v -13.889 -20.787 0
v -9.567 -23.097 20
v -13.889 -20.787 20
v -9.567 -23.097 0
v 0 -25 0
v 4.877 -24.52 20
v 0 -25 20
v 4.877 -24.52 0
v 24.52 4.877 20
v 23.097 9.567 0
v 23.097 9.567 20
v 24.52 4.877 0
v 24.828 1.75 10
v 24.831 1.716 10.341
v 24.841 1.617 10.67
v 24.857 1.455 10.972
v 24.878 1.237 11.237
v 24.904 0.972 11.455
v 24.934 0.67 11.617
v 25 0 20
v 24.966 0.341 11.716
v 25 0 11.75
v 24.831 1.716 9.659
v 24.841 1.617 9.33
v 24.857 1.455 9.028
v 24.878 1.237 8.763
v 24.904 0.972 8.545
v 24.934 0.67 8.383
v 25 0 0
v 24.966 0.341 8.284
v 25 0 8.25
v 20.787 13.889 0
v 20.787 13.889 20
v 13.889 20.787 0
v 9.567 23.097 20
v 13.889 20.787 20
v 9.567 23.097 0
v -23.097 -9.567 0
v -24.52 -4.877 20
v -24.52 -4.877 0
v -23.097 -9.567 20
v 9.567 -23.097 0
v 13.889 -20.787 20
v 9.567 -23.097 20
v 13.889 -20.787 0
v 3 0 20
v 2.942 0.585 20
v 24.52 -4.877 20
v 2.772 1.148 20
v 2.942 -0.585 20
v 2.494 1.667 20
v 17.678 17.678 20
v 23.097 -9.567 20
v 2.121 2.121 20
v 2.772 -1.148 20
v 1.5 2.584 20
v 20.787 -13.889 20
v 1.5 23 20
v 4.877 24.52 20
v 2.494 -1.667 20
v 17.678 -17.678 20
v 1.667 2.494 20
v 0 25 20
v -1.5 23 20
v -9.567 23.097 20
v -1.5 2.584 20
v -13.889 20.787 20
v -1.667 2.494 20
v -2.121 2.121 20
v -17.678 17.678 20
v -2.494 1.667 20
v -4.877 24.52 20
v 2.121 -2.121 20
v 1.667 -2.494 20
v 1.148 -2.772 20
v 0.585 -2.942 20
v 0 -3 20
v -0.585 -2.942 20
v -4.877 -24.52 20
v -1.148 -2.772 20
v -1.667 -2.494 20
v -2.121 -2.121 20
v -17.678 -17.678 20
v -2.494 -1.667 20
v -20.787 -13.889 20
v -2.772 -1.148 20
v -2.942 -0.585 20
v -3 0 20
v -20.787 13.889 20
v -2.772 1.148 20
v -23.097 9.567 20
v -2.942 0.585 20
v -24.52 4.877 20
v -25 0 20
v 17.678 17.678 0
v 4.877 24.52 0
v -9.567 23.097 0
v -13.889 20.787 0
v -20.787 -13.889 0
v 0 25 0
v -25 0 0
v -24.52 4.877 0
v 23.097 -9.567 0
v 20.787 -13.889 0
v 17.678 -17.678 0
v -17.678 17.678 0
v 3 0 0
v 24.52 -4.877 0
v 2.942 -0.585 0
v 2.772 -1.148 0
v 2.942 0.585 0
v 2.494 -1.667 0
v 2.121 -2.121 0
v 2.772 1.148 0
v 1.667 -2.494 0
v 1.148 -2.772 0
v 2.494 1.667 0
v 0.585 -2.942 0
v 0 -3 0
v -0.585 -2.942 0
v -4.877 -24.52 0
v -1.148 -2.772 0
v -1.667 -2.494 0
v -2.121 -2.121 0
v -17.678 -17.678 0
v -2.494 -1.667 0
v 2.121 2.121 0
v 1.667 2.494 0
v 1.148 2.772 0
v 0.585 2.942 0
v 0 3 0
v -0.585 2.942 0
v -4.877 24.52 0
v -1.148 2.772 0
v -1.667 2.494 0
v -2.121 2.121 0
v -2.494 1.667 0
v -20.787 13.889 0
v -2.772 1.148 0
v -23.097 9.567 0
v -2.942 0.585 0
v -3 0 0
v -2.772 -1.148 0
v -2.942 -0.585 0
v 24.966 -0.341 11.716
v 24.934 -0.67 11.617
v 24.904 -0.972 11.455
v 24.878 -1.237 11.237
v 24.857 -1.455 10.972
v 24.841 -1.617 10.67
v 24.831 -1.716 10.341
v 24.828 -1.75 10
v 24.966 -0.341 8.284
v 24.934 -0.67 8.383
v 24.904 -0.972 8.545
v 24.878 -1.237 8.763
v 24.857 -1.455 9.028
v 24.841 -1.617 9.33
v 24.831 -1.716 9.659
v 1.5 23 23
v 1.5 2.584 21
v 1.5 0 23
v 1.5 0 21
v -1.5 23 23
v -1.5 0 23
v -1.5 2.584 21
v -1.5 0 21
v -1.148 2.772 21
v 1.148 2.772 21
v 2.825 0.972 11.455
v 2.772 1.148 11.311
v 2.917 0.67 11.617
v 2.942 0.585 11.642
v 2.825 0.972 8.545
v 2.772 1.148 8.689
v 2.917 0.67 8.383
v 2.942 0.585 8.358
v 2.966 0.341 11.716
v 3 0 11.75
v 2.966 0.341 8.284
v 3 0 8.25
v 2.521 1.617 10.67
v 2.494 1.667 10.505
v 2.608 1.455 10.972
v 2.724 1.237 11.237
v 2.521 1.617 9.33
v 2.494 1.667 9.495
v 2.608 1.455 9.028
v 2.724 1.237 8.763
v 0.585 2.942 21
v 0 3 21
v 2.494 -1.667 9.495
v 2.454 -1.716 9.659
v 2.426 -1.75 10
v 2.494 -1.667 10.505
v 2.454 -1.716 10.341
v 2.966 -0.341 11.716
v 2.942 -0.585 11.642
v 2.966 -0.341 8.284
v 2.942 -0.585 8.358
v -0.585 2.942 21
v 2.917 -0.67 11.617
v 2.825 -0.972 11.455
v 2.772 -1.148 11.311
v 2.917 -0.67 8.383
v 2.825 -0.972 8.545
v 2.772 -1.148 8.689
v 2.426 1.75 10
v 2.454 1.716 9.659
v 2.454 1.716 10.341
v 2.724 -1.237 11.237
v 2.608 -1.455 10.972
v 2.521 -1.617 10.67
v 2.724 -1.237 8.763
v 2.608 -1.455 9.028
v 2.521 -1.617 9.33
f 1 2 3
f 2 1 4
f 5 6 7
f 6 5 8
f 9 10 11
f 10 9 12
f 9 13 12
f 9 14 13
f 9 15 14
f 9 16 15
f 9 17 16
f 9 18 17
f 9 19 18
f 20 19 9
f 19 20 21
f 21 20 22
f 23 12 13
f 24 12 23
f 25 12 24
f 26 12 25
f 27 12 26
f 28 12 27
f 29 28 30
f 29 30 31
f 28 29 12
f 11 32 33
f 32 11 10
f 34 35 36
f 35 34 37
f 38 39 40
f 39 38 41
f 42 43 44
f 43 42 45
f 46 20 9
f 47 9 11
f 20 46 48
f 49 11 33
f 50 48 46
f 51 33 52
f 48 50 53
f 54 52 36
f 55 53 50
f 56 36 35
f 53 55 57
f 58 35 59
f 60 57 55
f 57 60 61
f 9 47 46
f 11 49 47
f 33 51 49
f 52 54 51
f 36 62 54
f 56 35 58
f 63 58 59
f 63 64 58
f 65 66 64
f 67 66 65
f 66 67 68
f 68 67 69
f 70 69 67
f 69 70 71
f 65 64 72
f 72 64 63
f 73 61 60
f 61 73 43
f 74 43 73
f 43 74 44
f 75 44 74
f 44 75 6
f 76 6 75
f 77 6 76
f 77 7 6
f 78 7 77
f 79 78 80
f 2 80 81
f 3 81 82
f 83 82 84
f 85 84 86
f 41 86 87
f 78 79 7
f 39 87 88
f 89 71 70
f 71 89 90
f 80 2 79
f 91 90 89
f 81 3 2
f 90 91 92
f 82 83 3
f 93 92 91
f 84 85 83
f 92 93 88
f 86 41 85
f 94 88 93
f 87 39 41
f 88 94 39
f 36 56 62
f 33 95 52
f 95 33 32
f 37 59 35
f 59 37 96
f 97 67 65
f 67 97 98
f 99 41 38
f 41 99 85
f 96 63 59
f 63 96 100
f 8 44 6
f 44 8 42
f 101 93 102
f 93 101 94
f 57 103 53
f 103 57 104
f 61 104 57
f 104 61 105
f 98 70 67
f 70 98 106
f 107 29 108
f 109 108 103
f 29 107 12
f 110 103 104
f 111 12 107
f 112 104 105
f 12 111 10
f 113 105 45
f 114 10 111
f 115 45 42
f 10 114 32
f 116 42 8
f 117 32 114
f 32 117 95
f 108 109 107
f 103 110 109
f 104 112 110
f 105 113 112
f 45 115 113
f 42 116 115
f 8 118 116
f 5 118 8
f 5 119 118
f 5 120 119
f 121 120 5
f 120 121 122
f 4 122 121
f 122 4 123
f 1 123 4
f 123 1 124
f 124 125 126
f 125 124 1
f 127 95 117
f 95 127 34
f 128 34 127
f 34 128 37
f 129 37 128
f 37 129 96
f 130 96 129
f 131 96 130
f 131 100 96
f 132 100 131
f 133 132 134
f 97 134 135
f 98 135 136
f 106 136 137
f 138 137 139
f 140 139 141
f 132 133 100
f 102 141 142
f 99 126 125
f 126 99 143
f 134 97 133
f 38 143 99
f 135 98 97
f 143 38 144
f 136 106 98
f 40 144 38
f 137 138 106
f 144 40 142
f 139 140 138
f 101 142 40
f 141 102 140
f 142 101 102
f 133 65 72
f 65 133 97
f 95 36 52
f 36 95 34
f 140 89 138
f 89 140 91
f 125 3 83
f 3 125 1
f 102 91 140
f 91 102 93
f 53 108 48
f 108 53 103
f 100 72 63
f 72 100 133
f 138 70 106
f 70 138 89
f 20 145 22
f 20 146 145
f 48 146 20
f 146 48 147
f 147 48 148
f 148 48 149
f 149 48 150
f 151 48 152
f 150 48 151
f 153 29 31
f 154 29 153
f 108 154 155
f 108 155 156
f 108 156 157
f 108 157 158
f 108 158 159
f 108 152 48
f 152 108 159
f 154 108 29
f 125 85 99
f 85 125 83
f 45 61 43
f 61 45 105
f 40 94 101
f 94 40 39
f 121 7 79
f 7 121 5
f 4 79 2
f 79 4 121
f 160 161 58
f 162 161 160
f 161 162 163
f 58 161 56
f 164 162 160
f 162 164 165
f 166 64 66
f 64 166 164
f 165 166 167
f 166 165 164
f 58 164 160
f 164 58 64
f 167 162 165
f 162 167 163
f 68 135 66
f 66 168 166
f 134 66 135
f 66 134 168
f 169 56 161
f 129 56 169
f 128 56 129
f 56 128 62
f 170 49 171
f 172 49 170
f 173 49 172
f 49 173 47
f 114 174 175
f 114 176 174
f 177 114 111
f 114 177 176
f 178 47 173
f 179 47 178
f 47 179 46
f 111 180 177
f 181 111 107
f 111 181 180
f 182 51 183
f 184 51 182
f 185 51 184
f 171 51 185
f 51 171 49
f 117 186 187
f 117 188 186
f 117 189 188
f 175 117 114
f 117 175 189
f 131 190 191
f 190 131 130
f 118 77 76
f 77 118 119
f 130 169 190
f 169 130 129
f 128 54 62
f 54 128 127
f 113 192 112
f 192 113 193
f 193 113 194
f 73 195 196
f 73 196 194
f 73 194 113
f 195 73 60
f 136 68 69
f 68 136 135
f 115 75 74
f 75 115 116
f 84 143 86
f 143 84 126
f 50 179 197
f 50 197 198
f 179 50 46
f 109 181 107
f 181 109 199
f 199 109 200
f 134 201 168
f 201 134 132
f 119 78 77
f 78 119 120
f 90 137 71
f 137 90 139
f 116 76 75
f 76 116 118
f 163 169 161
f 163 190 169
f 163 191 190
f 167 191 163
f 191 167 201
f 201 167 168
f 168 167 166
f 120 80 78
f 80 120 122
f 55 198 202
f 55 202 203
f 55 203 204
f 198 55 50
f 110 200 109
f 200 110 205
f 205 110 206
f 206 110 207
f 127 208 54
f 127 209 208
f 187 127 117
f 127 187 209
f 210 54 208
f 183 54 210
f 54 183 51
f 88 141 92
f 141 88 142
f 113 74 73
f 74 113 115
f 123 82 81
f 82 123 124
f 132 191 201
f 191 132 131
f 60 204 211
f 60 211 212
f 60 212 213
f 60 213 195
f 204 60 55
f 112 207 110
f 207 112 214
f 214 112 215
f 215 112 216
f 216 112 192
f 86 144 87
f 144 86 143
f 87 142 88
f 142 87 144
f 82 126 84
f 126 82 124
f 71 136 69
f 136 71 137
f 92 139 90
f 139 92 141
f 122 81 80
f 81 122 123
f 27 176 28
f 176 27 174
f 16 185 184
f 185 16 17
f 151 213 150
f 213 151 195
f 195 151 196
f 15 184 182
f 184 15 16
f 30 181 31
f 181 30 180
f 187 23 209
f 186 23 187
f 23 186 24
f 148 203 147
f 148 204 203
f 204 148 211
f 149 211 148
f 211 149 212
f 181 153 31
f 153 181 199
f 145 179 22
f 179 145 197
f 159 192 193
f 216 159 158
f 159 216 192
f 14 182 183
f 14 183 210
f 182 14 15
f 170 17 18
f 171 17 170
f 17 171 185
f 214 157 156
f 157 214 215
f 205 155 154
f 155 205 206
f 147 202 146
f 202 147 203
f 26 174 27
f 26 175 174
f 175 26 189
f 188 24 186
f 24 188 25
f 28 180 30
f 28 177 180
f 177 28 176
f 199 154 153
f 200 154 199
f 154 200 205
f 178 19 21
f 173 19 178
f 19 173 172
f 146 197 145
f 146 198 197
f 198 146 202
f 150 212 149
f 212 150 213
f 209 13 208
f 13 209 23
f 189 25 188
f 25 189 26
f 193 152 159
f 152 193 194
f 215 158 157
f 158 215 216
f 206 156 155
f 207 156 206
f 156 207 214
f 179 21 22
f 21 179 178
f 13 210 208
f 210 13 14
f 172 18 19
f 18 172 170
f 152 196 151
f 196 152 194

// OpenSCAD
$fn = 32;

// ----------------------------------------------------------------------
// Control knob: pointer knob
// ----------------------------------------------------------------------

// --- parameters (mm) ---
rib_w = 3;                // pointer rib width
rib_h = 4;                // pointer rib height
knob_d = 50;              // knob body diameter
knob_h = 20;              // knob body height
bore_d = 6;               // shaft bore diameter
set_d = 3.5;              // set screw bore diameter

rib_poke = rib_h - 1;  // rib height above the top
total_h = knob_h + rib_h - 1;  // overall height

difference() {
  union() {
    cylinder(h = knob_h, d = knob_d);
    translate([-rib_w / 2, 0, knob_h - 1])
      cube([rib_w, knob_d / 2 - 2, rib_h]);
  }
  translate([0, 0, -1]) cylinder(h = knob_h + 2, d = bore_d);
  translate([-1, 0, knob_h / 2]) rotate([0, 90, 0])
    cylinder(h = knob_d / 2 + bore_d / 2 + 2, d = set_d);}
